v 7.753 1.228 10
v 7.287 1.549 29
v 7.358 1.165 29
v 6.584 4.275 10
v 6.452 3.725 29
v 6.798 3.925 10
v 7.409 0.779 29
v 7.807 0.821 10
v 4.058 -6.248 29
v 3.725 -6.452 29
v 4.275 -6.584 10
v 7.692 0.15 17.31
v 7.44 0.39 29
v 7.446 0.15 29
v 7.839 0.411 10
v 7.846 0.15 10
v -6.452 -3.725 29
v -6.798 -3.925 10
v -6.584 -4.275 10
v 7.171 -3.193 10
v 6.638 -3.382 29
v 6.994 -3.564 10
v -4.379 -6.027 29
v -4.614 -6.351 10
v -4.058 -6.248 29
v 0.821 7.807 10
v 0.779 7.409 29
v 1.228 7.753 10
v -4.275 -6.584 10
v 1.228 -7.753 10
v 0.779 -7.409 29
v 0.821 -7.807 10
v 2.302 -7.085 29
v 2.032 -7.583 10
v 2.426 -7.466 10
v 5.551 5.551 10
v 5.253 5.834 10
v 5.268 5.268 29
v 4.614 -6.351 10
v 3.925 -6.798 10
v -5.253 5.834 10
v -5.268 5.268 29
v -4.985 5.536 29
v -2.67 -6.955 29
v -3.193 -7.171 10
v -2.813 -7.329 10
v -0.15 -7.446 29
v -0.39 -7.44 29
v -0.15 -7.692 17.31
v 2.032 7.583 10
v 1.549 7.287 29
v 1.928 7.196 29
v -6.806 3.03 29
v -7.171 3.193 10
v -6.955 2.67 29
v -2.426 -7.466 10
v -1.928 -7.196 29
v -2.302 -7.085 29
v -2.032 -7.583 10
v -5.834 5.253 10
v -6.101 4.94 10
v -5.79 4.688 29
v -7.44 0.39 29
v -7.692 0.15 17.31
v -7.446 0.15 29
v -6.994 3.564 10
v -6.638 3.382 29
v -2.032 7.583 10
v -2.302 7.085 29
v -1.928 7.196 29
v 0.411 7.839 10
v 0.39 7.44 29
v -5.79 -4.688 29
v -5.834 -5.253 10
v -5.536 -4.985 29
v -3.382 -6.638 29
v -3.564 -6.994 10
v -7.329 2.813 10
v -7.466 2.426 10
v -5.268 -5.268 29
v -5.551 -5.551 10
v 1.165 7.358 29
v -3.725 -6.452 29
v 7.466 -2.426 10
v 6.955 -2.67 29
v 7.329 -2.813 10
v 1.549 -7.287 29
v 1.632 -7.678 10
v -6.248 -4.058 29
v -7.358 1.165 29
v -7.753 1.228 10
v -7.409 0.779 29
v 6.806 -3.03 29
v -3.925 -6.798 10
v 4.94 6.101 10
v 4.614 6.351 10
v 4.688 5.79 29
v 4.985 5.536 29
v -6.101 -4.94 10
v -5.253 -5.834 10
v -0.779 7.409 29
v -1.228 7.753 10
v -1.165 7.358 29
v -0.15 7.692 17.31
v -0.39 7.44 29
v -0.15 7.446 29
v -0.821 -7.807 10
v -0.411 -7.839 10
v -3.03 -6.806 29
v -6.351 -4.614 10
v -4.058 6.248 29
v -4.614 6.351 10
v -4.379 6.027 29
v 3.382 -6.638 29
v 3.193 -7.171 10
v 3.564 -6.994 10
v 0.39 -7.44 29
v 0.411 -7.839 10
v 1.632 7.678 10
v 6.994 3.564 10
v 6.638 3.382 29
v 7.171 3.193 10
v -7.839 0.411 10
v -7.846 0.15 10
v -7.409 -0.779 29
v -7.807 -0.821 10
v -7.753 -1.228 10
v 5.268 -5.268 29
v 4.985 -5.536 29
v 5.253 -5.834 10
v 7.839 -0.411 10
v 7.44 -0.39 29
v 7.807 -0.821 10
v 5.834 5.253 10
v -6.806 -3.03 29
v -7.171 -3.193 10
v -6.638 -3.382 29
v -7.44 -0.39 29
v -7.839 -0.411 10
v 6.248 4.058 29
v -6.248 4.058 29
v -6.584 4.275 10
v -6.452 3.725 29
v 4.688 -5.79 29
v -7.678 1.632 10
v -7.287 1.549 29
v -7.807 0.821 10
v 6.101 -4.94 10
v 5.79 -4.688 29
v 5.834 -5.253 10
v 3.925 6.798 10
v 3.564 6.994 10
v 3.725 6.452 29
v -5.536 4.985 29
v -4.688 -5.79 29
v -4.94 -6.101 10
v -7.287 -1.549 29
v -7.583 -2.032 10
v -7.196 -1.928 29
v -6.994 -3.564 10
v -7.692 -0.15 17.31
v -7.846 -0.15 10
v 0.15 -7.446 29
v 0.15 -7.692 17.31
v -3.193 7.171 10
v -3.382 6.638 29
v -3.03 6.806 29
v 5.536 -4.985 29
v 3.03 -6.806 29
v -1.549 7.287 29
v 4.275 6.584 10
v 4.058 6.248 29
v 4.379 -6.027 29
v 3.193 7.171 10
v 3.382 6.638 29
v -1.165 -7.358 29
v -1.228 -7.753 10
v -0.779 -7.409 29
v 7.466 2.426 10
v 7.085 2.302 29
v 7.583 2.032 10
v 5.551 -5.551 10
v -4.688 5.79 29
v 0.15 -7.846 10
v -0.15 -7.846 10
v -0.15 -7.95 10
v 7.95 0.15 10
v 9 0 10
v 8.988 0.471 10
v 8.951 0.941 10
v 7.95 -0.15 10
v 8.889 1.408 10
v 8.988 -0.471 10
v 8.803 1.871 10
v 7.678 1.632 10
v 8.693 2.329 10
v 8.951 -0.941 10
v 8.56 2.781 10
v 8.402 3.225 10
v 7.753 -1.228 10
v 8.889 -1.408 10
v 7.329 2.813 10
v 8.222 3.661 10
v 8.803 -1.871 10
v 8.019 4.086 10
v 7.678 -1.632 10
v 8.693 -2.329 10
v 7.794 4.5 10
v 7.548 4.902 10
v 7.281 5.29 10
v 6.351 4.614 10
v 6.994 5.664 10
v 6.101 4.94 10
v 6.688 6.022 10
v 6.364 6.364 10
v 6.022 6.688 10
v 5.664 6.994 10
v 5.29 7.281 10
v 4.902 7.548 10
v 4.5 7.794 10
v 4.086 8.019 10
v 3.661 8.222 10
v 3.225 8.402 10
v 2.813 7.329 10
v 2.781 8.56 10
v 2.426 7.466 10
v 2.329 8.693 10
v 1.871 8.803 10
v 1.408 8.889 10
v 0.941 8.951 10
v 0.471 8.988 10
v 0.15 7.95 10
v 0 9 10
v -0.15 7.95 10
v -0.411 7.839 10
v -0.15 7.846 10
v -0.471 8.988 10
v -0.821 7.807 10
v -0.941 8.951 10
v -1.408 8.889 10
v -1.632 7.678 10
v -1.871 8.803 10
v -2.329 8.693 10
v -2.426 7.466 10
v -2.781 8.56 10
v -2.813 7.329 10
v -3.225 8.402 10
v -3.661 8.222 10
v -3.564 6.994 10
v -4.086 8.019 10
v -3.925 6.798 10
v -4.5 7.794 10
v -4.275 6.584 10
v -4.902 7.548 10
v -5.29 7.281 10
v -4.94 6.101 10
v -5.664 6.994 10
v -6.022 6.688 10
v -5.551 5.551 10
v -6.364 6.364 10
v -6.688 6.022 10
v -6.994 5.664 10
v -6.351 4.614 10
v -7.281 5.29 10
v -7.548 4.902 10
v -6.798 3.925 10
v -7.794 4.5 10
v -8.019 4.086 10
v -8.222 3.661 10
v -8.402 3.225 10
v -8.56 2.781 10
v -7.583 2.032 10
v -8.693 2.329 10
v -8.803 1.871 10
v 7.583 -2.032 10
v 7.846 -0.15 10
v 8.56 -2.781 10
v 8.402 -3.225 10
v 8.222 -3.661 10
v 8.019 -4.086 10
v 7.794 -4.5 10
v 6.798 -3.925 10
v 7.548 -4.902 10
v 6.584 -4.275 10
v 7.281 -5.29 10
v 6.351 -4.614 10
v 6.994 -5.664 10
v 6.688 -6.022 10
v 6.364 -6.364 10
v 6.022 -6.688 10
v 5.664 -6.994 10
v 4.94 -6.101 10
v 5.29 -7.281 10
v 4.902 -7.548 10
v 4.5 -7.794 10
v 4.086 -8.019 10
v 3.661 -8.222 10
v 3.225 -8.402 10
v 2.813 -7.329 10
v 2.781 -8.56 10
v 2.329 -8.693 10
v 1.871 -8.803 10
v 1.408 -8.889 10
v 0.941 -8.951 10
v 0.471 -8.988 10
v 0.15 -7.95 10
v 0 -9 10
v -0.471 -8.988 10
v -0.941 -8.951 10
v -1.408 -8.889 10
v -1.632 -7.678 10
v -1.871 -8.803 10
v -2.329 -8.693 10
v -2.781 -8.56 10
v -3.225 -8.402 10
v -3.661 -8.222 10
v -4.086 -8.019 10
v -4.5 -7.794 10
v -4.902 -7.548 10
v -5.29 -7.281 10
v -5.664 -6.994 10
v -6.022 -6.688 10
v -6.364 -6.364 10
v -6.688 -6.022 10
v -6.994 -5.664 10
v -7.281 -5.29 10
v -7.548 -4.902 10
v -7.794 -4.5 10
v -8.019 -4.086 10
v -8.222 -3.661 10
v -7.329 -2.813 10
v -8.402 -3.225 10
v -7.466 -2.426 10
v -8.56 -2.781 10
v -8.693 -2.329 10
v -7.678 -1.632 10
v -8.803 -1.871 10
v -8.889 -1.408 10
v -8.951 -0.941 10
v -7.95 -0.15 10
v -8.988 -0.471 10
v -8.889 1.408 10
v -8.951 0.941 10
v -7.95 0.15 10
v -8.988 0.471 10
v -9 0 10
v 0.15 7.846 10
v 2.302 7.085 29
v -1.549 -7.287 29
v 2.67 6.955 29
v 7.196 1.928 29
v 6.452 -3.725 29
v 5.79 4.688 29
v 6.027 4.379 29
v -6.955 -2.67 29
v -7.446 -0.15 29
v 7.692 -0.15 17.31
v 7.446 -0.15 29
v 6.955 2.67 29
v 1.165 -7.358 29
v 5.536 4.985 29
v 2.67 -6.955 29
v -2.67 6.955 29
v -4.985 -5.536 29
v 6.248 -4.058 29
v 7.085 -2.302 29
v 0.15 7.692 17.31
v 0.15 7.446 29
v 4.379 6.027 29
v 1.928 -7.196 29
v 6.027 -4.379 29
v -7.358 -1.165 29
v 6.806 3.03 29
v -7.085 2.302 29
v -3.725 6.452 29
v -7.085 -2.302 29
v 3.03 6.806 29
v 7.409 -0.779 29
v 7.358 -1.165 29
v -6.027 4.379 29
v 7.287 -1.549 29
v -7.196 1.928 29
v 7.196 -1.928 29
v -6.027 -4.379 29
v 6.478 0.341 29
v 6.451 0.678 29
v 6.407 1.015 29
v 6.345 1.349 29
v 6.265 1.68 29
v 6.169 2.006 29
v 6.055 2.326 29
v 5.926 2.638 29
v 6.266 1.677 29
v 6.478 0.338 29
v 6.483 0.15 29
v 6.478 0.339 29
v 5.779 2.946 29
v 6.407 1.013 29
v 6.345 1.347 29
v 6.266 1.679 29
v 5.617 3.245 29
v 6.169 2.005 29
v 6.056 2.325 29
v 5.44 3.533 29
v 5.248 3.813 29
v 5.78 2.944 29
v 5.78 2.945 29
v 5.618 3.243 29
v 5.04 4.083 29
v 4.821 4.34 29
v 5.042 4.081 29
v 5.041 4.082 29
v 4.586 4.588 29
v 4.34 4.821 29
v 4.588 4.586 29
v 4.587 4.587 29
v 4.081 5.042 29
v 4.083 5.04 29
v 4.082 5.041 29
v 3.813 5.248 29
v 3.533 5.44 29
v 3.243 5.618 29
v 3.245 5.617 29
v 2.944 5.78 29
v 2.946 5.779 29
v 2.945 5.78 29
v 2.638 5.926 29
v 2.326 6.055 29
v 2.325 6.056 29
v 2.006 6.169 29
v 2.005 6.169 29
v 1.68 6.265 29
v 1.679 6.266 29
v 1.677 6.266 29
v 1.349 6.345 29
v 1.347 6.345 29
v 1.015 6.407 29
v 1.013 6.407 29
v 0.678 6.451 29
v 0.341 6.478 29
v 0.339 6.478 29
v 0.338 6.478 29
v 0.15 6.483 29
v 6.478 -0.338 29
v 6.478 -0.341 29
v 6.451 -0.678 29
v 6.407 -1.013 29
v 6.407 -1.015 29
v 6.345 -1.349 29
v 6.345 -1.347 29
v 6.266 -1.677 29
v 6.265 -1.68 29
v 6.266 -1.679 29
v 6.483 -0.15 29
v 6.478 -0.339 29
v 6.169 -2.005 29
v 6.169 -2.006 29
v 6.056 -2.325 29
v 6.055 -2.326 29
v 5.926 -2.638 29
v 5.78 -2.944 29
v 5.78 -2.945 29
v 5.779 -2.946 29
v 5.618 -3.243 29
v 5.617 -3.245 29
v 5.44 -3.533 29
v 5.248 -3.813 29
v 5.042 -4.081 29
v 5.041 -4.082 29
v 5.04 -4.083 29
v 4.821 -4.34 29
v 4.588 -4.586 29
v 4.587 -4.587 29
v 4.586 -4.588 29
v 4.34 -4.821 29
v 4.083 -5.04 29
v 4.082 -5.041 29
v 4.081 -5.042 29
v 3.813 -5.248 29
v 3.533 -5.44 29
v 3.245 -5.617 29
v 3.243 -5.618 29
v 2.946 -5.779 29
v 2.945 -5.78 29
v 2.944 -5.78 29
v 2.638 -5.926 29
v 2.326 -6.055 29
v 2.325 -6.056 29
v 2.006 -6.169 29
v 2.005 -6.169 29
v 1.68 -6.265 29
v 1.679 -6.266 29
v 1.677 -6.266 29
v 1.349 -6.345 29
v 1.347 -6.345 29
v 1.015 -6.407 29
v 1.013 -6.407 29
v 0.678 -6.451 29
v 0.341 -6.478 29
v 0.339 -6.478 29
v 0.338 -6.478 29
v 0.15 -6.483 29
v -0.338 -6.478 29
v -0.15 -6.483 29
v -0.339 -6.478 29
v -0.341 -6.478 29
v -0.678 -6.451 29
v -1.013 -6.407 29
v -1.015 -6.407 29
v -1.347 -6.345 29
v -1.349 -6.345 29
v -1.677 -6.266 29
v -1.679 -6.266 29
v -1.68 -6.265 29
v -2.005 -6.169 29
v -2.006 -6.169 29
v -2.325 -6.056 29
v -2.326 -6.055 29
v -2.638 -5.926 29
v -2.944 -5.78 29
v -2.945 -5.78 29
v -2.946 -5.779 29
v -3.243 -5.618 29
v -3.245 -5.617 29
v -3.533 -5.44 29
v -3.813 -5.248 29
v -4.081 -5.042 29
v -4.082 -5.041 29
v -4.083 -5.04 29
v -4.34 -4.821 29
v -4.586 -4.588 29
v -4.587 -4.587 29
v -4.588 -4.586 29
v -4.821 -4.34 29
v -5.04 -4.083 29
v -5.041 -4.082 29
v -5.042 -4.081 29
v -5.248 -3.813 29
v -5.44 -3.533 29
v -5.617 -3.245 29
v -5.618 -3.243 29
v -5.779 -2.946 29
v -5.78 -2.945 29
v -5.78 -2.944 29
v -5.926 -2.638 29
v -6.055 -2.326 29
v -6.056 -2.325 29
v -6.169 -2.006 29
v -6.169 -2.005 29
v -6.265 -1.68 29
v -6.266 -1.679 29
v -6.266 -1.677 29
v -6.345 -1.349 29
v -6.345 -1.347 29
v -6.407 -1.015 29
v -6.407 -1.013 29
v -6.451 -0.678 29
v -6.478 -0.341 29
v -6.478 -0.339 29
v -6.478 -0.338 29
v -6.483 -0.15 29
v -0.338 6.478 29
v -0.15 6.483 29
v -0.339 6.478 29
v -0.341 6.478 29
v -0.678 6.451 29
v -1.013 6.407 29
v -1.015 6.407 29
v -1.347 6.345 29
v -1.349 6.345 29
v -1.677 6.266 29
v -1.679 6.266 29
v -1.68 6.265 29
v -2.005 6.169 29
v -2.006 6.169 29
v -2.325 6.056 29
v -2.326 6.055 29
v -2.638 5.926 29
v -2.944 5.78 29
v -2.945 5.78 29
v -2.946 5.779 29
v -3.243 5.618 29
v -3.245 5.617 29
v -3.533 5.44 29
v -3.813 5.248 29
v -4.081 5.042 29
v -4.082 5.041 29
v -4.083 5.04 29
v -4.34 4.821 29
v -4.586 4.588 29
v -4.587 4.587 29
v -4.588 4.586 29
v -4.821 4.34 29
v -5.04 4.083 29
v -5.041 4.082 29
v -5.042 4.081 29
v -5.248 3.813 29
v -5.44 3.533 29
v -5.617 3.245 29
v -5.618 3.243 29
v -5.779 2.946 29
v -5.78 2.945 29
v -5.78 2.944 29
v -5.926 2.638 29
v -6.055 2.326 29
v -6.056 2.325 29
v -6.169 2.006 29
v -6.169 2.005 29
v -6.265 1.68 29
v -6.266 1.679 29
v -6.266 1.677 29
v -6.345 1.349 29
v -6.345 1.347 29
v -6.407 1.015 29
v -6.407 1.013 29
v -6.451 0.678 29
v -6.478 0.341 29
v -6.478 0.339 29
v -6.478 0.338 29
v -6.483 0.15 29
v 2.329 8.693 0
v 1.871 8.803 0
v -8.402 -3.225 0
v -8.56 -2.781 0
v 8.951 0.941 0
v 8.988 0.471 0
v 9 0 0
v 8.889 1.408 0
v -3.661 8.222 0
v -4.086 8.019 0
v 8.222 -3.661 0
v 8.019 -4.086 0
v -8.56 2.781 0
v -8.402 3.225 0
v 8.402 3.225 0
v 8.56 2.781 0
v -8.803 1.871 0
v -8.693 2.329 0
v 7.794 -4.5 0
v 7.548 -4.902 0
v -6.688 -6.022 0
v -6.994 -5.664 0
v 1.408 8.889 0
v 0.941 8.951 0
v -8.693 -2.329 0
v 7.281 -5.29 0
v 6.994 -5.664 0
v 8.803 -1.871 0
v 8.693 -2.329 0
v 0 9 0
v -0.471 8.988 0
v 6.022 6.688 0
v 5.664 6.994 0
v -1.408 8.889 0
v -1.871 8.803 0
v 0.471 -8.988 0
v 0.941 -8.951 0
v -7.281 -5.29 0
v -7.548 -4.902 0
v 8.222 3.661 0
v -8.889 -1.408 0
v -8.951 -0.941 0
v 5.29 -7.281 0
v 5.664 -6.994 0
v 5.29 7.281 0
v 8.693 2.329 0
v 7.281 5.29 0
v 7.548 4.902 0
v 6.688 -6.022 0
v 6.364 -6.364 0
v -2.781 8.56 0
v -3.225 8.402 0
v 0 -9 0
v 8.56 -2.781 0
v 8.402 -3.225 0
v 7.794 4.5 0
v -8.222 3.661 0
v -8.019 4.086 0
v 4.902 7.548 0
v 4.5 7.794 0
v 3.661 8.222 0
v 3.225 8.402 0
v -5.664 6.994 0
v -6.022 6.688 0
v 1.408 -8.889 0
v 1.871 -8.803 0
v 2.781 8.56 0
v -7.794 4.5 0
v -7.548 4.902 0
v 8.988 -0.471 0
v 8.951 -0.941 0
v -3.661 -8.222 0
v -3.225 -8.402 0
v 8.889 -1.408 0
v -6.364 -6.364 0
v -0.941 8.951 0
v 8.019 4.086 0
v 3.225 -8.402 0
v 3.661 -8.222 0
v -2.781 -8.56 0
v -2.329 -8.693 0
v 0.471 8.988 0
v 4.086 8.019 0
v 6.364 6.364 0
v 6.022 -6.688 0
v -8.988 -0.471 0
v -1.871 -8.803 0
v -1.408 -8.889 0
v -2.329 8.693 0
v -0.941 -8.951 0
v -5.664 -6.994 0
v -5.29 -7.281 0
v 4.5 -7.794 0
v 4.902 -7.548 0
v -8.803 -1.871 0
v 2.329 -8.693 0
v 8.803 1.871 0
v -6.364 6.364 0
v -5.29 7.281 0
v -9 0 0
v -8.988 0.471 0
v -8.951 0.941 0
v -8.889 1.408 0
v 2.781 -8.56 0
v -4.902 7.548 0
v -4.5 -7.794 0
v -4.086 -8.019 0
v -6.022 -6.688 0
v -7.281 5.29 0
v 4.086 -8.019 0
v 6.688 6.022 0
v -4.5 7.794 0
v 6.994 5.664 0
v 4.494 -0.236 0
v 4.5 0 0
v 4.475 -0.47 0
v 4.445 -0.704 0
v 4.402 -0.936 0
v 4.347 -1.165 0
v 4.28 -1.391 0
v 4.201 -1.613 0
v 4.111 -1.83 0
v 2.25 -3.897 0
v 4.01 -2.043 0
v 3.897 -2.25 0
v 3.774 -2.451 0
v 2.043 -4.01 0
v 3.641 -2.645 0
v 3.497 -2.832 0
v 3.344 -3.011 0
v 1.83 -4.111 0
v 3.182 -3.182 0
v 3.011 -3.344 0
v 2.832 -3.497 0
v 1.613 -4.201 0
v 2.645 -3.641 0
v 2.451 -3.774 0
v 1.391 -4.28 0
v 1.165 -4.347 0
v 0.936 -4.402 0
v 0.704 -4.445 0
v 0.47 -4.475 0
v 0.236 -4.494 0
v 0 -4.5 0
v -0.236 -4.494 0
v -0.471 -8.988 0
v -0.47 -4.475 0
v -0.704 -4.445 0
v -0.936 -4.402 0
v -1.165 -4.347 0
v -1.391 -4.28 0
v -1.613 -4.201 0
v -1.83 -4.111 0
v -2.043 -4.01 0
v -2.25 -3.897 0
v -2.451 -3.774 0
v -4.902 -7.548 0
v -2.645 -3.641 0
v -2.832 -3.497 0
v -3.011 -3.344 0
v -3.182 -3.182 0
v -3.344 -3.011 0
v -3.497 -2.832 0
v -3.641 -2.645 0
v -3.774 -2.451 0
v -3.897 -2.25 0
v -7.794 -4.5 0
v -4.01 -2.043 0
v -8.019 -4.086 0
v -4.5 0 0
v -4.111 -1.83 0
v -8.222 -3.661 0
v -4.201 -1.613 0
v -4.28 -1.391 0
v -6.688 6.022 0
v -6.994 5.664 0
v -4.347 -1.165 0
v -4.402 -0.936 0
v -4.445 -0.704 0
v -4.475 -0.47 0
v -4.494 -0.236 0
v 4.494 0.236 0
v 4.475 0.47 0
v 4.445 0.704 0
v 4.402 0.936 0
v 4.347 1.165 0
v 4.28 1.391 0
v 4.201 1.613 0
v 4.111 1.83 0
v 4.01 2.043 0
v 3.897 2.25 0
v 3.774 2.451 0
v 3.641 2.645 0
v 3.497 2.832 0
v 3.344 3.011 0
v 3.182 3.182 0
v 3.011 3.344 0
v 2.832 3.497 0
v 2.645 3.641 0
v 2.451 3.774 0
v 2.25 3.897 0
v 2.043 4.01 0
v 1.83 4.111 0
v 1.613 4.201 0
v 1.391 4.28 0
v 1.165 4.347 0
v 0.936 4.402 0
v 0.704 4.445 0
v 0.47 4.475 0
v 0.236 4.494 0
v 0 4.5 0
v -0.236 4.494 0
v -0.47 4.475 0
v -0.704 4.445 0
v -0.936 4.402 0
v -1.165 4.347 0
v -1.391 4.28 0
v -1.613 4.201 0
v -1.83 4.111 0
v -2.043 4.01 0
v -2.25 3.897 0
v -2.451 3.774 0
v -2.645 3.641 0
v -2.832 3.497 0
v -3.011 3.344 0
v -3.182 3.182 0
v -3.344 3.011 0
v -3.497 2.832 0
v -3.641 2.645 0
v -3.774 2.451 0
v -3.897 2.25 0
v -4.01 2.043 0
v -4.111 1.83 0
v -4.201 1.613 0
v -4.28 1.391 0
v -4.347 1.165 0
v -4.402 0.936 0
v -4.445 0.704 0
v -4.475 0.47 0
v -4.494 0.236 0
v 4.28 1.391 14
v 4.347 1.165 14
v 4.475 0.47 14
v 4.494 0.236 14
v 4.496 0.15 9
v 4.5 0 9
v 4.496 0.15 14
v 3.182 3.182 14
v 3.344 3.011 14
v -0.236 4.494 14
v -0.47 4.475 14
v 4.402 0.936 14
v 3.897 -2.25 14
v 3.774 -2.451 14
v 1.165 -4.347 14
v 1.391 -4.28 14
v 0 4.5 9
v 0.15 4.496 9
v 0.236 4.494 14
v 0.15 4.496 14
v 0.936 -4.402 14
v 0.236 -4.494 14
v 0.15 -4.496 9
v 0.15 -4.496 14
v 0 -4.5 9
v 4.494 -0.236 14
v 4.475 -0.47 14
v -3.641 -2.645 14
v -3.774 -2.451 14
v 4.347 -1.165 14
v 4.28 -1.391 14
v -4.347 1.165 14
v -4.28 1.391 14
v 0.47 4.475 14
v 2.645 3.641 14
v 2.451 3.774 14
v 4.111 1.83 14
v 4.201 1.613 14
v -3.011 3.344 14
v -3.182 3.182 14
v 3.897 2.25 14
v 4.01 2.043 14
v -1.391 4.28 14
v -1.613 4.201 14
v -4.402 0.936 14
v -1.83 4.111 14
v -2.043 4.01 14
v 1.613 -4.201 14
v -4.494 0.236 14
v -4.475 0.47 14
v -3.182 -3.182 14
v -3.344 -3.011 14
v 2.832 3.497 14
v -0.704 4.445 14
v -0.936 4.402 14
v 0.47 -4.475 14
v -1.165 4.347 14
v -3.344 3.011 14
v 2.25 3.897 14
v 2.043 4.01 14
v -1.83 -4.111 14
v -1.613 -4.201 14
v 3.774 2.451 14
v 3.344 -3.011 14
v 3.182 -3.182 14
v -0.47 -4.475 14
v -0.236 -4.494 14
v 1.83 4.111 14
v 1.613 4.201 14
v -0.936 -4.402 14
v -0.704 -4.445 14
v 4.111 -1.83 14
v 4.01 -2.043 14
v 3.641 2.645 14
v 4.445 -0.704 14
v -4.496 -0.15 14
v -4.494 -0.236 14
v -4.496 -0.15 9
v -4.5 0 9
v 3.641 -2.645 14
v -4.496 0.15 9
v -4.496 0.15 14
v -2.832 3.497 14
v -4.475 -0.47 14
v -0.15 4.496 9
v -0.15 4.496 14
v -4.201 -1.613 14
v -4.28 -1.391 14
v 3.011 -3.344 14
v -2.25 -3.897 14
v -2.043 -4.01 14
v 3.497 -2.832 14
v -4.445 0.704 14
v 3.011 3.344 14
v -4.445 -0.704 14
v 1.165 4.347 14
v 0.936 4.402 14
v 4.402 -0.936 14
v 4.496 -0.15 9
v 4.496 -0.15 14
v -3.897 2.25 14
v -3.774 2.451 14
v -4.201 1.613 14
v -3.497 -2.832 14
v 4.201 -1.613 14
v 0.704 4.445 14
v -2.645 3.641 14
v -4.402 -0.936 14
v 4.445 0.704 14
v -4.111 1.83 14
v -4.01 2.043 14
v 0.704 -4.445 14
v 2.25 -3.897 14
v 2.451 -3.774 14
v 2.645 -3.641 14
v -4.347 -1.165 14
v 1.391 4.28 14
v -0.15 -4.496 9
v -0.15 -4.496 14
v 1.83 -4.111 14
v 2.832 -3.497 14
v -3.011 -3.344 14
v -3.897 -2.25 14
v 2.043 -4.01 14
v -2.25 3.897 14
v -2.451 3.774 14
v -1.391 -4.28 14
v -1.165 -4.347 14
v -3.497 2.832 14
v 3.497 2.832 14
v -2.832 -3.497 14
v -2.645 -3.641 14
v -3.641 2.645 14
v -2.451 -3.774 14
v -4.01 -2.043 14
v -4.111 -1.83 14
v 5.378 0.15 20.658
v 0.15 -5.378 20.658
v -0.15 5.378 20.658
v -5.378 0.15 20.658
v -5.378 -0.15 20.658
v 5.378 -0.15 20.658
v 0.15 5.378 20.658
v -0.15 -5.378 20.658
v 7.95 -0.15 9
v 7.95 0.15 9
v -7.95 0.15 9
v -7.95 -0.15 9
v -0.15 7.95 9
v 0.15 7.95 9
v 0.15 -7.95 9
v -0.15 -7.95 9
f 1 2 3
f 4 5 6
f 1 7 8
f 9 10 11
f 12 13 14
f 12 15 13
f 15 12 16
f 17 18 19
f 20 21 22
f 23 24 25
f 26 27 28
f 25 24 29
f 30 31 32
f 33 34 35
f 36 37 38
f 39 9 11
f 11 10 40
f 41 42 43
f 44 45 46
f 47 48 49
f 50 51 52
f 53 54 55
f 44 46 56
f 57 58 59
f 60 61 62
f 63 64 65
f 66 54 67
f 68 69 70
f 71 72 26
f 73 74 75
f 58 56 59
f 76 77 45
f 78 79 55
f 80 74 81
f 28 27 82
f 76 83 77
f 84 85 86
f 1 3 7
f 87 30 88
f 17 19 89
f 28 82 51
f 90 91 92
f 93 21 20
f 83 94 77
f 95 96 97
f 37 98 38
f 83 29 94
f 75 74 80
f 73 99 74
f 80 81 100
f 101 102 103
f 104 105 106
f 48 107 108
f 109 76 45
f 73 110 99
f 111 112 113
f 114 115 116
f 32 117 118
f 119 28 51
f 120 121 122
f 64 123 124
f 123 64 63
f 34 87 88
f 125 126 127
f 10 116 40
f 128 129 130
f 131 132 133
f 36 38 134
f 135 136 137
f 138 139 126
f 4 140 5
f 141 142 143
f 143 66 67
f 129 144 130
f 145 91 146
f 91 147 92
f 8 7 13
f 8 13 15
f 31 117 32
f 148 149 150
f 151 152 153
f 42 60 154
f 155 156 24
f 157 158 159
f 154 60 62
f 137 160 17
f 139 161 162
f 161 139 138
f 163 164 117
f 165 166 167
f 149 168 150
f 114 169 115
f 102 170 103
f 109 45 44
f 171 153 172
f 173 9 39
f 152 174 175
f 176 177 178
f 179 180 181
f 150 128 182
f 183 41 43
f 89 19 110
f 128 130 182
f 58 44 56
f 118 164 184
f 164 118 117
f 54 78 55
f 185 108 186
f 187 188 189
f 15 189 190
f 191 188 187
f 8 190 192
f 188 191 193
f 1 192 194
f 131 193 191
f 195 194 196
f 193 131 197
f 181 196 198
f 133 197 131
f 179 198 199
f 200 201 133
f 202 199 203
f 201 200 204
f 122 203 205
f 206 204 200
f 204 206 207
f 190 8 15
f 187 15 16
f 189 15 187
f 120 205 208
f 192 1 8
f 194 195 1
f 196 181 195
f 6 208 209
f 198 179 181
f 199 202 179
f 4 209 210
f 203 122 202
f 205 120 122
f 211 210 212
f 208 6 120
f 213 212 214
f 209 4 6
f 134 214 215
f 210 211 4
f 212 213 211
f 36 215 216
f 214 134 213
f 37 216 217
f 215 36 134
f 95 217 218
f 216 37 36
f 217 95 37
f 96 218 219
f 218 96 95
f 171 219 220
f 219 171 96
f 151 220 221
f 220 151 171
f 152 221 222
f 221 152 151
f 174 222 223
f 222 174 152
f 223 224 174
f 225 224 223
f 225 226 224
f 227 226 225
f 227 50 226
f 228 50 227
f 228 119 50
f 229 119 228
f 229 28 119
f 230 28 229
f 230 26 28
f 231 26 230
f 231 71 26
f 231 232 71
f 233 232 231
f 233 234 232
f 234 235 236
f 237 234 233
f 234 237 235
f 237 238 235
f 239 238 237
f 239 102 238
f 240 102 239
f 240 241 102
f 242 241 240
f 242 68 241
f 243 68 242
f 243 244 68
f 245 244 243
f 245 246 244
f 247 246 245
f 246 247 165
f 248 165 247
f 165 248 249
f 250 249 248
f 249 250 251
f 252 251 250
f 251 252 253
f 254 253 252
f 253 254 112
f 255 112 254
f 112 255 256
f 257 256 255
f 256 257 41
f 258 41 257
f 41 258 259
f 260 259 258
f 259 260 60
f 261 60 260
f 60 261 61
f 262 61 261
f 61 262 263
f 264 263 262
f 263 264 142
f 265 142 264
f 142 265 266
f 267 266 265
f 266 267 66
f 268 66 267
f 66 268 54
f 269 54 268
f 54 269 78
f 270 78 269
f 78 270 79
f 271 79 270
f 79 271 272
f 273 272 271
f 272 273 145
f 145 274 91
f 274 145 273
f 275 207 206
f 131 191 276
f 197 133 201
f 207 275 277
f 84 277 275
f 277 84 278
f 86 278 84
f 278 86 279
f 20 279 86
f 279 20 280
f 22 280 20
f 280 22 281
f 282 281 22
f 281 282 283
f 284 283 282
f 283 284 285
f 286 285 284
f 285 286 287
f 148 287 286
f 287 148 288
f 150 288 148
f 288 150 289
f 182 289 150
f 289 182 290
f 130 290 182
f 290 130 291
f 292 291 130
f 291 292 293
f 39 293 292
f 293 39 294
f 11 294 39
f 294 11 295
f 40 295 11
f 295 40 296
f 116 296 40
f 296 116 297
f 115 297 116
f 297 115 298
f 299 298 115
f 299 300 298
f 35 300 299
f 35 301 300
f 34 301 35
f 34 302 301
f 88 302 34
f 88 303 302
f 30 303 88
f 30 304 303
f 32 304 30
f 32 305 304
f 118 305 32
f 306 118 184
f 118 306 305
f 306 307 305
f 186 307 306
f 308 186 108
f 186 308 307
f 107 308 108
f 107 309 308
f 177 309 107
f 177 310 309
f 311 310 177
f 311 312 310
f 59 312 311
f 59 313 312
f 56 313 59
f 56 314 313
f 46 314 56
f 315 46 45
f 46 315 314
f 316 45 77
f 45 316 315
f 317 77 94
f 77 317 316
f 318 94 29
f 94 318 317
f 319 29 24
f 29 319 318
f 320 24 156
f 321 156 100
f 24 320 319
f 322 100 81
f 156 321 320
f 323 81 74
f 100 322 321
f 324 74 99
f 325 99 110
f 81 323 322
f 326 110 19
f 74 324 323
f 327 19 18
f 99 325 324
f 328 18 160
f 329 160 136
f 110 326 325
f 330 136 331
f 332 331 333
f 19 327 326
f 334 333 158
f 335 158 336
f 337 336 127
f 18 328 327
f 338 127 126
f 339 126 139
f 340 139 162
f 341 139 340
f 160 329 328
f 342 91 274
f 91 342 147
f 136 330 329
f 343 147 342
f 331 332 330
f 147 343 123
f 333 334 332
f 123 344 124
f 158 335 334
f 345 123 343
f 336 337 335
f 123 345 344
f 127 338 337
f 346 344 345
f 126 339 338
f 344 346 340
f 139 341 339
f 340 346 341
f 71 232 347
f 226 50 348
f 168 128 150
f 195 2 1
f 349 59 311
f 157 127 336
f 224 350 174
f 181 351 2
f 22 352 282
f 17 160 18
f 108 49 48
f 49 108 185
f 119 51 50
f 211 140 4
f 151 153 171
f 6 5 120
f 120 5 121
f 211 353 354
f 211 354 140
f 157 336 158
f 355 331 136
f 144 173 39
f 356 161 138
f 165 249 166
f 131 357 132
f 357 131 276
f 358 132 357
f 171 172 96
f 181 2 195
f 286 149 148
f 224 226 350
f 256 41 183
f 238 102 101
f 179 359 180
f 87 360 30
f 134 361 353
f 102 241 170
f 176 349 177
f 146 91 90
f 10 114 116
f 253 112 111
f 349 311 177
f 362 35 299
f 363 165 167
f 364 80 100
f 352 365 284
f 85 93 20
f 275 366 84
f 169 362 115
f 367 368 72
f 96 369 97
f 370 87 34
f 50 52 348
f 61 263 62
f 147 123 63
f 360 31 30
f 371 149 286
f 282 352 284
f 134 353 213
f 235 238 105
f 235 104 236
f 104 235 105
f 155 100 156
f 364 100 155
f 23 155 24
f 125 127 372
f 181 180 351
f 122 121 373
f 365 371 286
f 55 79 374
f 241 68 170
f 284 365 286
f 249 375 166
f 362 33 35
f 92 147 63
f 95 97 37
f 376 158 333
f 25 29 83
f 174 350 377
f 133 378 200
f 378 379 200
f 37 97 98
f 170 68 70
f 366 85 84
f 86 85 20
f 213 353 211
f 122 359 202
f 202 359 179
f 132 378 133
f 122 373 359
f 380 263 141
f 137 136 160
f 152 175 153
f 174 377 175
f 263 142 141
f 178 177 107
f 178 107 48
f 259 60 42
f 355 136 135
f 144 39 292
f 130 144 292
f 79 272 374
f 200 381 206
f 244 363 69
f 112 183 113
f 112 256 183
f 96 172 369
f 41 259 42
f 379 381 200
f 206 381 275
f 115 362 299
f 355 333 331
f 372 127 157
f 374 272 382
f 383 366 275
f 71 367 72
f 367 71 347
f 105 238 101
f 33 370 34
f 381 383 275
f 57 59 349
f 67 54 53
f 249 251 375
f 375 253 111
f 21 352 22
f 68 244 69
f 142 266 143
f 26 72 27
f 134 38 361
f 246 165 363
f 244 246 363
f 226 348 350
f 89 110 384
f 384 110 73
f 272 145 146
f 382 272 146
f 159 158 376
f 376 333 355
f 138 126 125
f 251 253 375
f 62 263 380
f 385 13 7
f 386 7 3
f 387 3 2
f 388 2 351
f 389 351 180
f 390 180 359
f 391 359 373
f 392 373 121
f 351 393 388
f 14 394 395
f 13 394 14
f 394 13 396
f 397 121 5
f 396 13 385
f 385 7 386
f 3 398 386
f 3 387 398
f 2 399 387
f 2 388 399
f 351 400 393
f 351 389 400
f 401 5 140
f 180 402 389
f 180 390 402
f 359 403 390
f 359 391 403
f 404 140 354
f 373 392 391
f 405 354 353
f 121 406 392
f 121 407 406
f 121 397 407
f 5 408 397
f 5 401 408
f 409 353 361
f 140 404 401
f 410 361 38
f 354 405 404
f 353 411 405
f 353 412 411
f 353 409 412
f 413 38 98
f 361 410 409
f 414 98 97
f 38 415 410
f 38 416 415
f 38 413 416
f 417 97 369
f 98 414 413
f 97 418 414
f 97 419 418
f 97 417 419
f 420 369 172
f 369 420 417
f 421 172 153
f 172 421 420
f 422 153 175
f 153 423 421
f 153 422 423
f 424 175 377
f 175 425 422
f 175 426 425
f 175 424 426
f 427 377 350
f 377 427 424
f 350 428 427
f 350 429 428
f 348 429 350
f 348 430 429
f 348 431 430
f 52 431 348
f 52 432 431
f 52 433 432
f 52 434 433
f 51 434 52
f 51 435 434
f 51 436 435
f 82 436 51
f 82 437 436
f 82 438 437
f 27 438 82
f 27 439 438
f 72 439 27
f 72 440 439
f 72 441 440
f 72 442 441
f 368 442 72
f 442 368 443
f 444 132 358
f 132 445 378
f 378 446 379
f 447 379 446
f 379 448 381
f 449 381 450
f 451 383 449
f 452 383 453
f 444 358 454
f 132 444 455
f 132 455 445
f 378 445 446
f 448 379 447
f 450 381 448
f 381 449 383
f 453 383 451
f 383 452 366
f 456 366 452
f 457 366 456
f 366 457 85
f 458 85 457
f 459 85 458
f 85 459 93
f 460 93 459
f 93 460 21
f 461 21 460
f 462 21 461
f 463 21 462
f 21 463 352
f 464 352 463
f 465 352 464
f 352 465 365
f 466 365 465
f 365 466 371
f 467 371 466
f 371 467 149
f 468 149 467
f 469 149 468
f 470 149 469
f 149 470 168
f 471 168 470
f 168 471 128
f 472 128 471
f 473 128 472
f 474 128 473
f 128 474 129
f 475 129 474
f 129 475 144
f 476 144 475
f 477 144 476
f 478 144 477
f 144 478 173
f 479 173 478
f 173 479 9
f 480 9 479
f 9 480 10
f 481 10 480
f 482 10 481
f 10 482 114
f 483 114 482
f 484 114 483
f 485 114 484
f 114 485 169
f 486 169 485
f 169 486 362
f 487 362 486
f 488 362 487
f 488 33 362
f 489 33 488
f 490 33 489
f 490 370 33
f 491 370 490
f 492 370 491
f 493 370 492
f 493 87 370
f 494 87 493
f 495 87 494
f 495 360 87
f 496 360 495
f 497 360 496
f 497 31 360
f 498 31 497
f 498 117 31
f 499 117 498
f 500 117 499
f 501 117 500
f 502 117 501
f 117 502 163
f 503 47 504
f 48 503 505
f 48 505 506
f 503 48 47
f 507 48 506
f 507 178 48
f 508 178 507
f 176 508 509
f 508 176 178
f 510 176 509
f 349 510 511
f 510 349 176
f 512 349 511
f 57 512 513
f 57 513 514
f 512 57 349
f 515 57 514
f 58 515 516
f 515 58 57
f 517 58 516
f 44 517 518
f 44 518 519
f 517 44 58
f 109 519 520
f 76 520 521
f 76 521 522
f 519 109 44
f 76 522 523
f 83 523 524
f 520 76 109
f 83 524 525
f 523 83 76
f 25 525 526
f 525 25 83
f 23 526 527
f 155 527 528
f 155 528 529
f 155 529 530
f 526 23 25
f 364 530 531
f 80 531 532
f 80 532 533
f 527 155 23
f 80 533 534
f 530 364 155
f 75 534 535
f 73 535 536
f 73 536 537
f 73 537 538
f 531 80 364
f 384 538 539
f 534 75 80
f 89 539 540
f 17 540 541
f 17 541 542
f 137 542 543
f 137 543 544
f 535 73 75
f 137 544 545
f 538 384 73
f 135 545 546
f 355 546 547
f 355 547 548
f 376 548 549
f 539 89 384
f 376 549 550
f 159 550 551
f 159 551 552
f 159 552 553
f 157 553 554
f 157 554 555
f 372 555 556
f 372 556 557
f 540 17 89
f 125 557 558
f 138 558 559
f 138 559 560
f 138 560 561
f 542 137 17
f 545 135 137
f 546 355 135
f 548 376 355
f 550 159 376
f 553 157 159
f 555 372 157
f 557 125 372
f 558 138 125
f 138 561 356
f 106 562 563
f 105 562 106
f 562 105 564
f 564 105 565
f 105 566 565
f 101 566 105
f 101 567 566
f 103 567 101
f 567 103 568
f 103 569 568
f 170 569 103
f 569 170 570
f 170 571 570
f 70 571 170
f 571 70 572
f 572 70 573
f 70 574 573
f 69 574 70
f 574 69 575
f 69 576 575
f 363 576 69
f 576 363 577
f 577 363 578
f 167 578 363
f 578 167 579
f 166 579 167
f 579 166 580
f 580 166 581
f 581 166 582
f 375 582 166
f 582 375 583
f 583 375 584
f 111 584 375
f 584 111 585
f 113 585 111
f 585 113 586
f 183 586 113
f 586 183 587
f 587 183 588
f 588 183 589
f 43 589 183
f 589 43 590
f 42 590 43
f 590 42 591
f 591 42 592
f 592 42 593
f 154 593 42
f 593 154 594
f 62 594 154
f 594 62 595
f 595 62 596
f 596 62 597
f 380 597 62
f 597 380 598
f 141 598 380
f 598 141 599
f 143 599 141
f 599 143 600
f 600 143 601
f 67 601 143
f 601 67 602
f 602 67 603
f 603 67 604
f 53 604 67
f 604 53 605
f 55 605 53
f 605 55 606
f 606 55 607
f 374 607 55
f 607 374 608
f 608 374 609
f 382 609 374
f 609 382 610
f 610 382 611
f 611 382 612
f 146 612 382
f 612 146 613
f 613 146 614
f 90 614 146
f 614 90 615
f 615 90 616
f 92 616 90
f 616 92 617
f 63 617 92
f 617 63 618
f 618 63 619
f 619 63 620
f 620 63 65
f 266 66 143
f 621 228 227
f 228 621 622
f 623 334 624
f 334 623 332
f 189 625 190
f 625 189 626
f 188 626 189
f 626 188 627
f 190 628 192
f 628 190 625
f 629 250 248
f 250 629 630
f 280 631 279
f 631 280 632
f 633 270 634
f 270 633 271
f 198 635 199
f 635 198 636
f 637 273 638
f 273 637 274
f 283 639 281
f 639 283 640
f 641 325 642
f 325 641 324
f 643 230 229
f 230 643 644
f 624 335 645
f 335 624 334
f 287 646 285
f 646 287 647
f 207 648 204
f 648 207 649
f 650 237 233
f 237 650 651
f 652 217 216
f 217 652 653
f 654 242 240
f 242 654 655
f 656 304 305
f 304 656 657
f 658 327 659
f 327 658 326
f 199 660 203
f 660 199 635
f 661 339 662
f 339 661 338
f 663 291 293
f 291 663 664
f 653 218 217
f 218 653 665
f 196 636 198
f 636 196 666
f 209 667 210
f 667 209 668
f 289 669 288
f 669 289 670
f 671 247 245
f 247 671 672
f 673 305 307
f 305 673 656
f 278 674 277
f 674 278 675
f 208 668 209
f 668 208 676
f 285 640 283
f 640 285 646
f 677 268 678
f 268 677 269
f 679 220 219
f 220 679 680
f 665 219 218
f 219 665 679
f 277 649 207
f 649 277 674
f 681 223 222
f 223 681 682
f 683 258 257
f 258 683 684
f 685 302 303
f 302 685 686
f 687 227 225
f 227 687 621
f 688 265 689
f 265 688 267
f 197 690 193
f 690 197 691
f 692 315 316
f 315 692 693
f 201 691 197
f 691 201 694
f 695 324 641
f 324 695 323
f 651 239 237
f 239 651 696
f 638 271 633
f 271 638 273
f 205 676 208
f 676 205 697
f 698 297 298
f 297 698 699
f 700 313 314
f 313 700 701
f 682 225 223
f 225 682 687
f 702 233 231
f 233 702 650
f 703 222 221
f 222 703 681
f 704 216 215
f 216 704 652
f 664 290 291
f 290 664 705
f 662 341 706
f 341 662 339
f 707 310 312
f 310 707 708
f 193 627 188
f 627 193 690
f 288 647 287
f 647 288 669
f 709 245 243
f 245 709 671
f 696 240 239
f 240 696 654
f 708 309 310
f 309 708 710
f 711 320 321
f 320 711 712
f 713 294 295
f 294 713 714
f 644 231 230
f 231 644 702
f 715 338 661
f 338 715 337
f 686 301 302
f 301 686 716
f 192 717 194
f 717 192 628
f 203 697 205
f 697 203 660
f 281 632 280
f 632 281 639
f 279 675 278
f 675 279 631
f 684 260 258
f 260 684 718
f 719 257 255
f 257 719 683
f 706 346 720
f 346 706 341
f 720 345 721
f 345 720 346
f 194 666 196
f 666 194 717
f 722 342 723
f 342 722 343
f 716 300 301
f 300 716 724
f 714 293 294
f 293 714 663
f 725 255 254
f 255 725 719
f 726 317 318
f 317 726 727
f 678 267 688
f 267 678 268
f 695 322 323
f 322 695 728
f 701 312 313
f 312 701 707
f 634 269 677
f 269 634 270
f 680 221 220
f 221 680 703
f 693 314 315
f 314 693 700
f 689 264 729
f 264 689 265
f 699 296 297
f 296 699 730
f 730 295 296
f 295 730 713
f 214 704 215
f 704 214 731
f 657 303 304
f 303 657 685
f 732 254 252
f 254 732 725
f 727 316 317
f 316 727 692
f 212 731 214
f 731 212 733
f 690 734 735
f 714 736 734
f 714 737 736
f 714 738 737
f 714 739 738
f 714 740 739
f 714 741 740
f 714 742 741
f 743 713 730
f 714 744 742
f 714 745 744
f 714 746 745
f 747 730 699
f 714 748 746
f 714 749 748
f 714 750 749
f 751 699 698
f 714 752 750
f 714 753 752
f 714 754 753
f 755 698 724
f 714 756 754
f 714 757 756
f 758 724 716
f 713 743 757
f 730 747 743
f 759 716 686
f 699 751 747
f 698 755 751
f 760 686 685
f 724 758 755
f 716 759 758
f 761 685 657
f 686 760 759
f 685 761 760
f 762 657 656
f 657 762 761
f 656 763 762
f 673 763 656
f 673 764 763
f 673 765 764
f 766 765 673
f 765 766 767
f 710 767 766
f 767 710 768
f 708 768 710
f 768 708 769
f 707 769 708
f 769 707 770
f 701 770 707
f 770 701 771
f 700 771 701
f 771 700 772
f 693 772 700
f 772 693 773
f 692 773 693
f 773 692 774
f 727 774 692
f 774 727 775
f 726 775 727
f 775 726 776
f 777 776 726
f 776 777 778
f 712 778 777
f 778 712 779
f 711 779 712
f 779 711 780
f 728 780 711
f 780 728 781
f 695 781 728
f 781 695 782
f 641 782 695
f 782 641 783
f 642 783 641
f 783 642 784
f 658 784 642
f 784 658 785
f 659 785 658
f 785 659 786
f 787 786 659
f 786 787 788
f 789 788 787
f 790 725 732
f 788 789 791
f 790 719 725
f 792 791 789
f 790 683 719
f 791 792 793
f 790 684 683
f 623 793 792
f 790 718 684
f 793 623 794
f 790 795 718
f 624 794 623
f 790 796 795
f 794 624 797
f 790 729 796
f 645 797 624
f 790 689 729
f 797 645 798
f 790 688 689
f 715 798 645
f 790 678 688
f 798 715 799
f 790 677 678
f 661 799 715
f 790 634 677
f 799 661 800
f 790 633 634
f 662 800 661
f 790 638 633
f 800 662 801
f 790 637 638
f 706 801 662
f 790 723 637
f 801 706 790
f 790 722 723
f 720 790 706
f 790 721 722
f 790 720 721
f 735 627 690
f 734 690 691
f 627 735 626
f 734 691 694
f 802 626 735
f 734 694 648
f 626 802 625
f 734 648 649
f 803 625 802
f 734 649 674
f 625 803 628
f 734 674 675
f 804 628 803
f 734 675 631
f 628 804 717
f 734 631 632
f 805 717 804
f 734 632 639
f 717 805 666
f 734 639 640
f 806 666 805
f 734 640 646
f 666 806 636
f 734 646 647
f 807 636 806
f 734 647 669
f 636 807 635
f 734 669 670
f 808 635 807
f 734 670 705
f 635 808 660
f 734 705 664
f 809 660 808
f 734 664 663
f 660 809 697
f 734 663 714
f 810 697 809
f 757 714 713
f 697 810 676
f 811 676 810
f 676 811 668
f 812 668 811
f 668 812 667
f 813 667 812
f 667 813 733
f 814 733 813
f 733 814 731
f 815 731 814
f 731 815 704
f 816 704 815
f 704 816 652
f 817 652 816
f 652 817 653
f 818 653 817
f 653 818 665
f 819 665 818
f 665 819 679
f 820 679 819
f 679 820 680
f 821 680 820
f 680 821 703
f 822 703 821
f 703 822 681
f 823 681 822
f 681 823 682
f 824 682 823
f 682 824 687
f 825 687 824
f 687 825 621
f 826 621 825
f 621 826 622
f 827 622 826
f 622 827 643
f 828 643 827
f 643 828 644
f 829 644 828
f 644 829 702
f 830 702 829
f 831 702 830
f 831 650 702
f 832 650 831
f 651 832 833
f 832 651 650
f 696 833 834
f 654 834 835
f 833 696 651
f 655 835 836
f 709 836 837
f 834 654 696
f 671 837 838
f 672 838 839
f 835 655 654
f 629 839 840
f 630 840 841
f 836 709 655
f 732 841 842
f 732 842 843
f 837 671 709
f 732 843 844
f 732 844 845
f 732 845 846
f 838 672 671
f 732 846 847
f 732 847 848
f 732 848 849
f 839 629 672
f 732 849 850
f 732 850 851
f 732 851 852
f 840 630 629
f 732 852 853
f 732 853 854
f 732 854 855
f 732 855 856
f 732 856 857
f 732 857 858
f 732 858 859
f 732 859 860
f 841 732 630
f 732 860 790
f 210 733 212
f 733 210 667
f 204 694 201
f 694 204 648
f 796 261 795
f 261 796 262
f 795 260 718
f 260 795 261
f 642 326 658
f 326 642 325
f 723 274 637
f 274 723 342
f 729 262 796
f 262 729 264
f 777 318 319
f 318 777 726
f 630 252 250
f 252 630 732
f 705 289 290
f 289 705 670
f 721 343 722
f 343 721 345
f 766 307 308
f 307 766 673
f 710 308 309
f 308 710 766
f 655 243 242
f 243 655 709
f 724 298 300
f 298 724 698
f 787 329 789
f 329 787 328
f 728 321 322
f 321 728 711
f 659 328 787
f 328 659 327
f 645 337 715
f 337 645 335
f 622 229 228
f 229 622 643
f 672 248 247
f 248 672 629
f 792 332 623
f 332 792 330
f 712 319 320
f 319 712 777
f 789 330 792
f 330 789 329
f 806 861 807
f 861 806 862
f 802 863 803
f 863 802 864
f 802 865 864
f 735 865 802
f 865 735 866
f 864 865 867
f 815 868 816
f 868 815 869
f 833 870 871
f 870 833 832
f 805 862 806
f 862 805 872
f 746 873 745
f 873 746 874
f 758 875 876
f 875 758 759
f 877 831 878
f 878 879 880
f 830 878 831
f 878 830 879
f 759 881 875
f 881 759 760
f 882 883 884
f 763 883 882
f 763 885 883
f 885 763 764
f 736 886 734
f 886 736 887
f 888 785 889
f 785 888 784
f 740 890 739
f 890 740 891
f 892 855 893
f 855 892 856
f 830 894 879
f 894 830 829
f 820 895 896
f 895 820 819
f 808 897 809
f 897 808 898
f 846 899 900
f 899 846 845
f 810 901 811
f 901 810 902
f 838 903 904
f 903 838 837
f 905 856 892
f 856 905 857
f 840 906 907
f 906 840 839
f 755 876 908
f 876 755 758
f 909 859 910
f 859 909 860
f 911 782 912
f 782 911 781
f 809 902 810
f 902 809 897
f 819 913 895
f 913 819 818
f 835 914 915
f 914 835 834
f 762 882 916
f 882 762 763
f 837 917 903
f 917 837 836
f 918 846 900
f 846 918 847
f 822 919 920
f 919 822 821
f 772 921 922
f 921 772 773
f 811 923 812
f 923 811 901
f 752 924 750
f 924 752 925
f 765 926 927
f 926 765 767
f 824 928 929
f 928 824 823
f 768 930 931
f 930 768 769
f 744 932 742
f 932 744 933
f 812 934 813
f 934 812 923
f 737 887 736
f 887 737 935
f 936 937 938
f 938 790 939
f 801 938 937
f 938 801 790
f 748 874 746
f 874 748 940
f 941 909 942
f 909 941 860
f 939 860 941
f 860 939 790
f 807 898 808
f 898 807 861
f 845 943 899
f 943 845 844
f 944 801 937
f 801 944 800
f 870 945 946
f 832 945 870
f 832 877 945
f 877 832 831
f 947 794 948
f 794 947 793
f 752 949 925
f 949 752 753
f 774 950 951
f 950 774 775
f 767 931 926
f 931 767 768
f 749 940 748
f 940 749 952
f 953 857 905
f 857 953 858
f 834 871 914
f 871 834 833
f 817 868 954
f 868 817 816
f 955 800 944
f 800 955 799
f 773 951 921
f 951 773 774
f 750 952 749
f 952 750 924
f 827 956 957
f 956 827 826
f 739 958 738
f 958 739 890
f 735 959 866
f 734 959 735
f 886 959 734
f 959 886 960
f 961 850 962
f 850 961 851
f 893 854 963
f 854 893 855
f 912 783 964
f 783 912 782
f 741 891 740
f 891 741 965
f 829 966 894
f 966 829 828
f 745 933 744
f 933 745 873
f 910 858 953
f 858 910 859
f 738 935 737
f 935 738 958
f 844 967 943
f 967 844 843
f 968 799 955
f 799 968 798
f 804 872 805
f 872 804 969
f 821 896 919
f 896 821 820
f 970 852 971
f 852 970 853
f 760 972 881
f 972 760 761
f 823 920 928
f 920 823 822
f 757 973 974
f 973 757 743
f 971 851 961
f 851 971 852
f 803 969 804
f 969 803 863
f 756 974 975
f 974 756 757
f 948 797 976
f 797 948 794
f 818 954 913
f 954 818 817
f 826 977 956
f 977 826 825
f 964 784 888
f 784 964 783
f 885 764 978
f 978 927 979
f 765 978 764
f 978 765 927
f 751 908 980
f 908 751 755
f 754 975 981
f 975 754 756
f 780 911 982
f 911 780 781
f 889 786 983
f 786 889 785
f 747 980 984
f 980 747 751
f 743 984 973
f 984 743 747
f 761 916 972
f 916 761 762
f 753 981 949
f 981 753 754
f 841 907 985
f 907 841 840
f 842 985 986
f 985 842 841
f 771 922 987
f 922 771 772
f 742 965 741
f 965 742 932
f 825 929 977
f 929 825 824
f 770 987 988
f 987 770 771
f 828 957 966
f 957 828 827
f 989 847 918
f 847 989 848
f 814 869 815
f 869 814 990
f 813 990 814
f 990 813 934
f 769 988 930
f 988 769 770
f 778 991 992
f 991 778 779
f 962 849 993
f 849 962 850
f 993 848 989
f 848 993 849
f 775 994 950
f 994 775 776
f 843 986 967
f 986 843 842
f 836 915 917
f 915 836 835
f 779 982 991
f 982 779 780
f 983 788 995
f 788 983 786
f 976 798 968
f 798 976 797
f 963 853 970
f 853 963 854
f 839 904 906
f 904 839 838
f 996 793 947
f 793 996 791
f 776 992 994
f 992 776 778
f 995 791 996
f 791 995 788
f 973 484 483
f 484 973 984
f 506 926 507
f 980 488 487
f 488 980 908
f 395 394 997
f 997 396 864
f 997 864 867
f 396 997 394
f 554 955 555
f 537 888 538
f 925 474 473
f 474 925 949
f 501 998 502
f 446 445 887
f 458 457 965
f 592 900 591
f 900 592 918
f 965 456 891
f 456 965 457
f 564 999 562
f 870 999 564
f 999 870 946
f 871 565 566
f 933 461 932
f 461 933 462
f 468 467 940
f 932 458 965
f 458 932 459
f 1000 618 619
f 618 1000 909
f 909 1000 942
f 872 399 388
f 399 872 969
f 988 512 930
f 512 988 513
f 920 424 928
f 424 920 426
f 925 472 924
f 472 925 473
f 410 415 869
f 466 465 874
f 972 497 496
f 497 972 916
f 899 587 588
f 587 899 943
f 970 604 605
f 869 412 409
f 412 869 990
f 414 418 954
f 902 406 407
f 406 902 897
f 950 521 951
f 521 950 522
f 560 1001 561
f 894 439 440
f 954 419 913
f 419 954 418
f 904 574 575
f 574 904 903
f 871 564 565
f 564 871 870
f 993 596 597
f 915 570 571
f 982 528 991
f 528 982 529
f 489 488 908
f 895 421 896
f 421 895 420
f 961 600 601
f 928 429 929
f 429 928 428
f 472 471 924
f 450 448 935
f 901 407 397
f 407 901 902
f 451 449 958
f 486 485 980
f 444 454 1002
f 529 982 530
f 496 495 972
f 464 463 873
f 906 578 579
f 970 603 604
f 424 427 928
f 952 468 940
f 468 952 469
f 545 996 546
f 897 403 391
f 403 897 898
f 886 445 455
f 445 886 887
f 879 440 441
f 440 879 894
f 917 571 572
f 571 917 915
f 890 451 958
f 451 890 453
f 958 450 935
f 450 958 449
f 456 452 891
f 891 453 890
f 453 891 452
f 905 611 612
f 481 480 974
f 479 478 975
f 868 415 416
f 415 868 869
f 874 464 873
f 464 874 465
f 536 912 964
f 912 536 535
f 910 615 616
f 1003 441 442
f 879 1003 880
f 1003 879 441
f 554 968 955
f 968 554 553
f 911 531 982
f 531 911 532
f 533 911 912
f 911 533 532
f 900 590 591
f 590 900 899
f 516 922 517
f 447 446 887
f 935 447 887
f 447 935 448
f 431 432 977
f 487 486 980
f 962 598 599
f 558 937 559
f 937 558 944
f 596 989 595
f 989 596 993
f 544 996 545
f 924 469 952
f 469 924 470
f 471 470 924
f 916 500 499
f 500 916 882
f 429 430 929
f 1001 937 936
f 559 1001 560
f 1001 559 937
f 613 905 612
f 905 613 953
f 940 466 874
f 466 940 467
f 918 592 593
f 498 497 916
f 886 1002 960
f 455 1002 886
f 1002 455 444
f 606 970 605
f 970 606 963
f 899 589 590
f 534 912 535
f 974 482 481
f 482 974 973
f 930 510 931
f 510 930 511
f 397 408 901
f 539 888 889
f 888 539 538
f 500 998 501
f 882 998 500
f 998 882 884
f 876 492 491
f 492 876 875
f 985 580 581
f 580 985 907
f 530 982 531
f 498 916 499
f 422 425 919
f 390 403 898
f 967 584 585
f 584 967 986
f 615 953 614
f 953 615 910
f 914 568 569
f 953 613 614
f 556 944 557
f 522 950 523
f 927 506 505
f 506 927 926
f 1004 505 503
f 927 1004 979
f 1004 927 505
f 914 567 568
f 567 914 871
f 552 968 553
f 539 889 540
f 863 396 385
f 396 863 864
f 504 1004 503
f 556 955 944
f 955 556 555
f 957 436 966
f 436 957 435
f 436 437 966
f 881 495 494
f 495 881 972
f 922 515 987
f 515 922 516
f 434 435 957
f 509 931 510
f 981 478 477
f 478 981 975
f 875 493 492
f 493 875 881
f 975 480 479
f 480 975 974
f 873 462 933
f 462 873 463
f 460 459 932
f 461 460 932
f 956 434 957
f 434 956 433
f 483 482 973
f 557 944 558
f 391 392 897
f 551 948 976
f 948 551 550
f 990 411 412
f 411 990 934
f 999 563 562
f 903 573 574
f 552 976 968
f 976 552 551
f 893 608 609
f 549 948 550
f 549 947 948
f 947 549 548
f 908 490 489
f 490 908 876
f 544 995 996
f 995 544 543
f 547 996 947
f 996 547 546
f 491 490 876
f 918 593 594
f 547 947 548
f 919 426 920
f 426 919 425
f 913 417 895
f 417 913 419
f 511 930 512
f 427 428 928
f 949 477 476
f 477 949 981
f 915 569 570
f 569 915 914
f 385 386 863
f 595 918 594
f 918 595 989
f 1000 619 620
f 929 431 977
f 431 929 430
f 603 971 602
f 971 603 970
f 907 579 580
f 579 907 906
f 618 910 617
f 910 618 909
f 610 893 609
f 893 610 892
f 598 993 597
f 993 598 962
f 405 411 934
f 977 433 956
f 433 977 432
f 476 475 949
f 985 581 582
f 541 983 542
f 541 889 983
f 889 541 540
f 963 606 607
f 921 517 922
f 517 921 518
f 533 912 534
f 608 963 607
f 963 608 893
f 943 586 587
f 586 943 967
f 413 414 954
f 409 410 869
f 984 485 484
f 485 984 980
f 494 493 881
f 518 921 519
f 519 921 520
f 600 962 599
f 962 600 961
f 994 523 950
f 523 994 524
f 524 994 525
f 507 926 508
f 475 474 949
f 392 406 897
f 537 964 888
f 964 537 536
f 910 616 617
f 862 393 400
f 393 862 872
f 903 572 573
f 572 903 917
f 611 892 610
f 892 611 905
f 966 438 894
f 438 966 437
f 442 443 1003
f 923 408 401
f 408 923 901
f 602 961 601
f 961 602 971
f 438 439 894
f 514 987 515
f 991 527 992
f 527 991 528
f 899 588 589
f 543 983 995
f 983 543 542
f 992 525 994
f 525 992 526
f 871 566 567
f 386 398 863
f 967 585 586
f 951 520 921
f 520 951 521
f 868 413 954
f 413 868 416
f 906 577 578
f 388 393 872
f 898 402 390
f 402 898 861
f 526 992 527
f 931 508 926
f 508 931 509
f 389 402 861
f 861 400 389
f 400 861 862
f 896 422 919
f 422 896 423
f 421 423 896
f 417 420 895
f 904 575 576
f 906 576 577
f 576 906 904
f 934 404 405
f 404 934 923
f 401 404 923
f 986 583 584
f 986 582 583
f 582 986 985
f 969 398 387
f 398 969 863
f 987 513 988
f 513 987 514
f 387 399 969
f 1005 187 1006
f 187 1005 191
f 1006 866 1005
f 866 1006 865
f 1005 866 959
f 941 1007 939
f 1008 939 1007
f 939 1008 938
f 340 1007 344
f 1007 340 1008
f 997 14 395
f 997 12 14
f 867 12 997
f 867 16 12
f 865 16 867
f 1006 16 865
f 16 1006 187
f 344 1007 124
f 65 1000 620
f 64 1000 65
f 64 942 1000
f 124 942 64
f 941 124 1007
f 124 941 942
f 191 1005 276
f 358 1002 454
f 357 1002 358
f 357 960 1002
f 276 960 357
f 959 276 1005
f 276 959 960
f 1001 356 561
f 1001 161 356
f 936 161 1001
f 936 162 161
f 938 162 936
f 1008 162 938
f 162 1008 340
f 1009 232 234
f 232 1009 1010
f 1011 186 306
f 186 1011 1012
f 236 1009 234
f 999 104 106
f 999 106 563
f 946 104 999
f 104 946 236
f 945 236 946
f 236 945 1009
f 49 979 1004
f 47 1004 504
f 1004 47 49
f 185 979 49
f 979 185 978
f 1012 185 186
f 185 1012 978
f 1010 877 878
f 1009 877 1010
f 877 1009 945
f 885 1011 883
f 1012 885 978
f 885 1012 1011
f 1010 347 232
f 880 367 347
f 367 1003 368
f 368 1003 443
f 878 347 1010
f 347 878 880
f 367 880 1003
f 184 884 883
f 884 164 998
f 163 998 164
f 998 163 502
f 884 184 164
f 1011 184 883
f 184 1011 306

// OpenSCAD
$fn=120;
total_h=29;
reverse_taper=0.4;
max_d=15.7;
max_r=max_d/2;
min_d=9;
min_r=min_d/2;
large_d=13;
large_r=large_d/2;
pad=0.1;
padd=pad*2;
distance_to_min=15;

throttle_d=18;
throttle_r=throttle_d/2;
throttle_h=10;

gap=0.3;
distance_to_gap=9;

module one_gap() {
    translate([-max_r-pad,-gap/2,distance_to_gap])
    cube([max_d+padd,gap,total_h+padd]);
}

difference() {
    union() {
        translate([0,0,throttle_h])
        cylinder(r1=max_r,r2=max_r-reverse_taper,h=total_h-throttle_h);
        cylinder(r=throttle_r,h=throttle_h);
    }
    translate([0,0,-pad])
    cylinder(r=min_r,h=total_h-distance_to_min+padd);
    translate([0,0,total_h-distance_to_min])
    cylinder(r1=min_r,r2=large_r,h=distance_to_min+pad);
    one_gap();
    rotate([0,0,90])
    one_gap();
}
